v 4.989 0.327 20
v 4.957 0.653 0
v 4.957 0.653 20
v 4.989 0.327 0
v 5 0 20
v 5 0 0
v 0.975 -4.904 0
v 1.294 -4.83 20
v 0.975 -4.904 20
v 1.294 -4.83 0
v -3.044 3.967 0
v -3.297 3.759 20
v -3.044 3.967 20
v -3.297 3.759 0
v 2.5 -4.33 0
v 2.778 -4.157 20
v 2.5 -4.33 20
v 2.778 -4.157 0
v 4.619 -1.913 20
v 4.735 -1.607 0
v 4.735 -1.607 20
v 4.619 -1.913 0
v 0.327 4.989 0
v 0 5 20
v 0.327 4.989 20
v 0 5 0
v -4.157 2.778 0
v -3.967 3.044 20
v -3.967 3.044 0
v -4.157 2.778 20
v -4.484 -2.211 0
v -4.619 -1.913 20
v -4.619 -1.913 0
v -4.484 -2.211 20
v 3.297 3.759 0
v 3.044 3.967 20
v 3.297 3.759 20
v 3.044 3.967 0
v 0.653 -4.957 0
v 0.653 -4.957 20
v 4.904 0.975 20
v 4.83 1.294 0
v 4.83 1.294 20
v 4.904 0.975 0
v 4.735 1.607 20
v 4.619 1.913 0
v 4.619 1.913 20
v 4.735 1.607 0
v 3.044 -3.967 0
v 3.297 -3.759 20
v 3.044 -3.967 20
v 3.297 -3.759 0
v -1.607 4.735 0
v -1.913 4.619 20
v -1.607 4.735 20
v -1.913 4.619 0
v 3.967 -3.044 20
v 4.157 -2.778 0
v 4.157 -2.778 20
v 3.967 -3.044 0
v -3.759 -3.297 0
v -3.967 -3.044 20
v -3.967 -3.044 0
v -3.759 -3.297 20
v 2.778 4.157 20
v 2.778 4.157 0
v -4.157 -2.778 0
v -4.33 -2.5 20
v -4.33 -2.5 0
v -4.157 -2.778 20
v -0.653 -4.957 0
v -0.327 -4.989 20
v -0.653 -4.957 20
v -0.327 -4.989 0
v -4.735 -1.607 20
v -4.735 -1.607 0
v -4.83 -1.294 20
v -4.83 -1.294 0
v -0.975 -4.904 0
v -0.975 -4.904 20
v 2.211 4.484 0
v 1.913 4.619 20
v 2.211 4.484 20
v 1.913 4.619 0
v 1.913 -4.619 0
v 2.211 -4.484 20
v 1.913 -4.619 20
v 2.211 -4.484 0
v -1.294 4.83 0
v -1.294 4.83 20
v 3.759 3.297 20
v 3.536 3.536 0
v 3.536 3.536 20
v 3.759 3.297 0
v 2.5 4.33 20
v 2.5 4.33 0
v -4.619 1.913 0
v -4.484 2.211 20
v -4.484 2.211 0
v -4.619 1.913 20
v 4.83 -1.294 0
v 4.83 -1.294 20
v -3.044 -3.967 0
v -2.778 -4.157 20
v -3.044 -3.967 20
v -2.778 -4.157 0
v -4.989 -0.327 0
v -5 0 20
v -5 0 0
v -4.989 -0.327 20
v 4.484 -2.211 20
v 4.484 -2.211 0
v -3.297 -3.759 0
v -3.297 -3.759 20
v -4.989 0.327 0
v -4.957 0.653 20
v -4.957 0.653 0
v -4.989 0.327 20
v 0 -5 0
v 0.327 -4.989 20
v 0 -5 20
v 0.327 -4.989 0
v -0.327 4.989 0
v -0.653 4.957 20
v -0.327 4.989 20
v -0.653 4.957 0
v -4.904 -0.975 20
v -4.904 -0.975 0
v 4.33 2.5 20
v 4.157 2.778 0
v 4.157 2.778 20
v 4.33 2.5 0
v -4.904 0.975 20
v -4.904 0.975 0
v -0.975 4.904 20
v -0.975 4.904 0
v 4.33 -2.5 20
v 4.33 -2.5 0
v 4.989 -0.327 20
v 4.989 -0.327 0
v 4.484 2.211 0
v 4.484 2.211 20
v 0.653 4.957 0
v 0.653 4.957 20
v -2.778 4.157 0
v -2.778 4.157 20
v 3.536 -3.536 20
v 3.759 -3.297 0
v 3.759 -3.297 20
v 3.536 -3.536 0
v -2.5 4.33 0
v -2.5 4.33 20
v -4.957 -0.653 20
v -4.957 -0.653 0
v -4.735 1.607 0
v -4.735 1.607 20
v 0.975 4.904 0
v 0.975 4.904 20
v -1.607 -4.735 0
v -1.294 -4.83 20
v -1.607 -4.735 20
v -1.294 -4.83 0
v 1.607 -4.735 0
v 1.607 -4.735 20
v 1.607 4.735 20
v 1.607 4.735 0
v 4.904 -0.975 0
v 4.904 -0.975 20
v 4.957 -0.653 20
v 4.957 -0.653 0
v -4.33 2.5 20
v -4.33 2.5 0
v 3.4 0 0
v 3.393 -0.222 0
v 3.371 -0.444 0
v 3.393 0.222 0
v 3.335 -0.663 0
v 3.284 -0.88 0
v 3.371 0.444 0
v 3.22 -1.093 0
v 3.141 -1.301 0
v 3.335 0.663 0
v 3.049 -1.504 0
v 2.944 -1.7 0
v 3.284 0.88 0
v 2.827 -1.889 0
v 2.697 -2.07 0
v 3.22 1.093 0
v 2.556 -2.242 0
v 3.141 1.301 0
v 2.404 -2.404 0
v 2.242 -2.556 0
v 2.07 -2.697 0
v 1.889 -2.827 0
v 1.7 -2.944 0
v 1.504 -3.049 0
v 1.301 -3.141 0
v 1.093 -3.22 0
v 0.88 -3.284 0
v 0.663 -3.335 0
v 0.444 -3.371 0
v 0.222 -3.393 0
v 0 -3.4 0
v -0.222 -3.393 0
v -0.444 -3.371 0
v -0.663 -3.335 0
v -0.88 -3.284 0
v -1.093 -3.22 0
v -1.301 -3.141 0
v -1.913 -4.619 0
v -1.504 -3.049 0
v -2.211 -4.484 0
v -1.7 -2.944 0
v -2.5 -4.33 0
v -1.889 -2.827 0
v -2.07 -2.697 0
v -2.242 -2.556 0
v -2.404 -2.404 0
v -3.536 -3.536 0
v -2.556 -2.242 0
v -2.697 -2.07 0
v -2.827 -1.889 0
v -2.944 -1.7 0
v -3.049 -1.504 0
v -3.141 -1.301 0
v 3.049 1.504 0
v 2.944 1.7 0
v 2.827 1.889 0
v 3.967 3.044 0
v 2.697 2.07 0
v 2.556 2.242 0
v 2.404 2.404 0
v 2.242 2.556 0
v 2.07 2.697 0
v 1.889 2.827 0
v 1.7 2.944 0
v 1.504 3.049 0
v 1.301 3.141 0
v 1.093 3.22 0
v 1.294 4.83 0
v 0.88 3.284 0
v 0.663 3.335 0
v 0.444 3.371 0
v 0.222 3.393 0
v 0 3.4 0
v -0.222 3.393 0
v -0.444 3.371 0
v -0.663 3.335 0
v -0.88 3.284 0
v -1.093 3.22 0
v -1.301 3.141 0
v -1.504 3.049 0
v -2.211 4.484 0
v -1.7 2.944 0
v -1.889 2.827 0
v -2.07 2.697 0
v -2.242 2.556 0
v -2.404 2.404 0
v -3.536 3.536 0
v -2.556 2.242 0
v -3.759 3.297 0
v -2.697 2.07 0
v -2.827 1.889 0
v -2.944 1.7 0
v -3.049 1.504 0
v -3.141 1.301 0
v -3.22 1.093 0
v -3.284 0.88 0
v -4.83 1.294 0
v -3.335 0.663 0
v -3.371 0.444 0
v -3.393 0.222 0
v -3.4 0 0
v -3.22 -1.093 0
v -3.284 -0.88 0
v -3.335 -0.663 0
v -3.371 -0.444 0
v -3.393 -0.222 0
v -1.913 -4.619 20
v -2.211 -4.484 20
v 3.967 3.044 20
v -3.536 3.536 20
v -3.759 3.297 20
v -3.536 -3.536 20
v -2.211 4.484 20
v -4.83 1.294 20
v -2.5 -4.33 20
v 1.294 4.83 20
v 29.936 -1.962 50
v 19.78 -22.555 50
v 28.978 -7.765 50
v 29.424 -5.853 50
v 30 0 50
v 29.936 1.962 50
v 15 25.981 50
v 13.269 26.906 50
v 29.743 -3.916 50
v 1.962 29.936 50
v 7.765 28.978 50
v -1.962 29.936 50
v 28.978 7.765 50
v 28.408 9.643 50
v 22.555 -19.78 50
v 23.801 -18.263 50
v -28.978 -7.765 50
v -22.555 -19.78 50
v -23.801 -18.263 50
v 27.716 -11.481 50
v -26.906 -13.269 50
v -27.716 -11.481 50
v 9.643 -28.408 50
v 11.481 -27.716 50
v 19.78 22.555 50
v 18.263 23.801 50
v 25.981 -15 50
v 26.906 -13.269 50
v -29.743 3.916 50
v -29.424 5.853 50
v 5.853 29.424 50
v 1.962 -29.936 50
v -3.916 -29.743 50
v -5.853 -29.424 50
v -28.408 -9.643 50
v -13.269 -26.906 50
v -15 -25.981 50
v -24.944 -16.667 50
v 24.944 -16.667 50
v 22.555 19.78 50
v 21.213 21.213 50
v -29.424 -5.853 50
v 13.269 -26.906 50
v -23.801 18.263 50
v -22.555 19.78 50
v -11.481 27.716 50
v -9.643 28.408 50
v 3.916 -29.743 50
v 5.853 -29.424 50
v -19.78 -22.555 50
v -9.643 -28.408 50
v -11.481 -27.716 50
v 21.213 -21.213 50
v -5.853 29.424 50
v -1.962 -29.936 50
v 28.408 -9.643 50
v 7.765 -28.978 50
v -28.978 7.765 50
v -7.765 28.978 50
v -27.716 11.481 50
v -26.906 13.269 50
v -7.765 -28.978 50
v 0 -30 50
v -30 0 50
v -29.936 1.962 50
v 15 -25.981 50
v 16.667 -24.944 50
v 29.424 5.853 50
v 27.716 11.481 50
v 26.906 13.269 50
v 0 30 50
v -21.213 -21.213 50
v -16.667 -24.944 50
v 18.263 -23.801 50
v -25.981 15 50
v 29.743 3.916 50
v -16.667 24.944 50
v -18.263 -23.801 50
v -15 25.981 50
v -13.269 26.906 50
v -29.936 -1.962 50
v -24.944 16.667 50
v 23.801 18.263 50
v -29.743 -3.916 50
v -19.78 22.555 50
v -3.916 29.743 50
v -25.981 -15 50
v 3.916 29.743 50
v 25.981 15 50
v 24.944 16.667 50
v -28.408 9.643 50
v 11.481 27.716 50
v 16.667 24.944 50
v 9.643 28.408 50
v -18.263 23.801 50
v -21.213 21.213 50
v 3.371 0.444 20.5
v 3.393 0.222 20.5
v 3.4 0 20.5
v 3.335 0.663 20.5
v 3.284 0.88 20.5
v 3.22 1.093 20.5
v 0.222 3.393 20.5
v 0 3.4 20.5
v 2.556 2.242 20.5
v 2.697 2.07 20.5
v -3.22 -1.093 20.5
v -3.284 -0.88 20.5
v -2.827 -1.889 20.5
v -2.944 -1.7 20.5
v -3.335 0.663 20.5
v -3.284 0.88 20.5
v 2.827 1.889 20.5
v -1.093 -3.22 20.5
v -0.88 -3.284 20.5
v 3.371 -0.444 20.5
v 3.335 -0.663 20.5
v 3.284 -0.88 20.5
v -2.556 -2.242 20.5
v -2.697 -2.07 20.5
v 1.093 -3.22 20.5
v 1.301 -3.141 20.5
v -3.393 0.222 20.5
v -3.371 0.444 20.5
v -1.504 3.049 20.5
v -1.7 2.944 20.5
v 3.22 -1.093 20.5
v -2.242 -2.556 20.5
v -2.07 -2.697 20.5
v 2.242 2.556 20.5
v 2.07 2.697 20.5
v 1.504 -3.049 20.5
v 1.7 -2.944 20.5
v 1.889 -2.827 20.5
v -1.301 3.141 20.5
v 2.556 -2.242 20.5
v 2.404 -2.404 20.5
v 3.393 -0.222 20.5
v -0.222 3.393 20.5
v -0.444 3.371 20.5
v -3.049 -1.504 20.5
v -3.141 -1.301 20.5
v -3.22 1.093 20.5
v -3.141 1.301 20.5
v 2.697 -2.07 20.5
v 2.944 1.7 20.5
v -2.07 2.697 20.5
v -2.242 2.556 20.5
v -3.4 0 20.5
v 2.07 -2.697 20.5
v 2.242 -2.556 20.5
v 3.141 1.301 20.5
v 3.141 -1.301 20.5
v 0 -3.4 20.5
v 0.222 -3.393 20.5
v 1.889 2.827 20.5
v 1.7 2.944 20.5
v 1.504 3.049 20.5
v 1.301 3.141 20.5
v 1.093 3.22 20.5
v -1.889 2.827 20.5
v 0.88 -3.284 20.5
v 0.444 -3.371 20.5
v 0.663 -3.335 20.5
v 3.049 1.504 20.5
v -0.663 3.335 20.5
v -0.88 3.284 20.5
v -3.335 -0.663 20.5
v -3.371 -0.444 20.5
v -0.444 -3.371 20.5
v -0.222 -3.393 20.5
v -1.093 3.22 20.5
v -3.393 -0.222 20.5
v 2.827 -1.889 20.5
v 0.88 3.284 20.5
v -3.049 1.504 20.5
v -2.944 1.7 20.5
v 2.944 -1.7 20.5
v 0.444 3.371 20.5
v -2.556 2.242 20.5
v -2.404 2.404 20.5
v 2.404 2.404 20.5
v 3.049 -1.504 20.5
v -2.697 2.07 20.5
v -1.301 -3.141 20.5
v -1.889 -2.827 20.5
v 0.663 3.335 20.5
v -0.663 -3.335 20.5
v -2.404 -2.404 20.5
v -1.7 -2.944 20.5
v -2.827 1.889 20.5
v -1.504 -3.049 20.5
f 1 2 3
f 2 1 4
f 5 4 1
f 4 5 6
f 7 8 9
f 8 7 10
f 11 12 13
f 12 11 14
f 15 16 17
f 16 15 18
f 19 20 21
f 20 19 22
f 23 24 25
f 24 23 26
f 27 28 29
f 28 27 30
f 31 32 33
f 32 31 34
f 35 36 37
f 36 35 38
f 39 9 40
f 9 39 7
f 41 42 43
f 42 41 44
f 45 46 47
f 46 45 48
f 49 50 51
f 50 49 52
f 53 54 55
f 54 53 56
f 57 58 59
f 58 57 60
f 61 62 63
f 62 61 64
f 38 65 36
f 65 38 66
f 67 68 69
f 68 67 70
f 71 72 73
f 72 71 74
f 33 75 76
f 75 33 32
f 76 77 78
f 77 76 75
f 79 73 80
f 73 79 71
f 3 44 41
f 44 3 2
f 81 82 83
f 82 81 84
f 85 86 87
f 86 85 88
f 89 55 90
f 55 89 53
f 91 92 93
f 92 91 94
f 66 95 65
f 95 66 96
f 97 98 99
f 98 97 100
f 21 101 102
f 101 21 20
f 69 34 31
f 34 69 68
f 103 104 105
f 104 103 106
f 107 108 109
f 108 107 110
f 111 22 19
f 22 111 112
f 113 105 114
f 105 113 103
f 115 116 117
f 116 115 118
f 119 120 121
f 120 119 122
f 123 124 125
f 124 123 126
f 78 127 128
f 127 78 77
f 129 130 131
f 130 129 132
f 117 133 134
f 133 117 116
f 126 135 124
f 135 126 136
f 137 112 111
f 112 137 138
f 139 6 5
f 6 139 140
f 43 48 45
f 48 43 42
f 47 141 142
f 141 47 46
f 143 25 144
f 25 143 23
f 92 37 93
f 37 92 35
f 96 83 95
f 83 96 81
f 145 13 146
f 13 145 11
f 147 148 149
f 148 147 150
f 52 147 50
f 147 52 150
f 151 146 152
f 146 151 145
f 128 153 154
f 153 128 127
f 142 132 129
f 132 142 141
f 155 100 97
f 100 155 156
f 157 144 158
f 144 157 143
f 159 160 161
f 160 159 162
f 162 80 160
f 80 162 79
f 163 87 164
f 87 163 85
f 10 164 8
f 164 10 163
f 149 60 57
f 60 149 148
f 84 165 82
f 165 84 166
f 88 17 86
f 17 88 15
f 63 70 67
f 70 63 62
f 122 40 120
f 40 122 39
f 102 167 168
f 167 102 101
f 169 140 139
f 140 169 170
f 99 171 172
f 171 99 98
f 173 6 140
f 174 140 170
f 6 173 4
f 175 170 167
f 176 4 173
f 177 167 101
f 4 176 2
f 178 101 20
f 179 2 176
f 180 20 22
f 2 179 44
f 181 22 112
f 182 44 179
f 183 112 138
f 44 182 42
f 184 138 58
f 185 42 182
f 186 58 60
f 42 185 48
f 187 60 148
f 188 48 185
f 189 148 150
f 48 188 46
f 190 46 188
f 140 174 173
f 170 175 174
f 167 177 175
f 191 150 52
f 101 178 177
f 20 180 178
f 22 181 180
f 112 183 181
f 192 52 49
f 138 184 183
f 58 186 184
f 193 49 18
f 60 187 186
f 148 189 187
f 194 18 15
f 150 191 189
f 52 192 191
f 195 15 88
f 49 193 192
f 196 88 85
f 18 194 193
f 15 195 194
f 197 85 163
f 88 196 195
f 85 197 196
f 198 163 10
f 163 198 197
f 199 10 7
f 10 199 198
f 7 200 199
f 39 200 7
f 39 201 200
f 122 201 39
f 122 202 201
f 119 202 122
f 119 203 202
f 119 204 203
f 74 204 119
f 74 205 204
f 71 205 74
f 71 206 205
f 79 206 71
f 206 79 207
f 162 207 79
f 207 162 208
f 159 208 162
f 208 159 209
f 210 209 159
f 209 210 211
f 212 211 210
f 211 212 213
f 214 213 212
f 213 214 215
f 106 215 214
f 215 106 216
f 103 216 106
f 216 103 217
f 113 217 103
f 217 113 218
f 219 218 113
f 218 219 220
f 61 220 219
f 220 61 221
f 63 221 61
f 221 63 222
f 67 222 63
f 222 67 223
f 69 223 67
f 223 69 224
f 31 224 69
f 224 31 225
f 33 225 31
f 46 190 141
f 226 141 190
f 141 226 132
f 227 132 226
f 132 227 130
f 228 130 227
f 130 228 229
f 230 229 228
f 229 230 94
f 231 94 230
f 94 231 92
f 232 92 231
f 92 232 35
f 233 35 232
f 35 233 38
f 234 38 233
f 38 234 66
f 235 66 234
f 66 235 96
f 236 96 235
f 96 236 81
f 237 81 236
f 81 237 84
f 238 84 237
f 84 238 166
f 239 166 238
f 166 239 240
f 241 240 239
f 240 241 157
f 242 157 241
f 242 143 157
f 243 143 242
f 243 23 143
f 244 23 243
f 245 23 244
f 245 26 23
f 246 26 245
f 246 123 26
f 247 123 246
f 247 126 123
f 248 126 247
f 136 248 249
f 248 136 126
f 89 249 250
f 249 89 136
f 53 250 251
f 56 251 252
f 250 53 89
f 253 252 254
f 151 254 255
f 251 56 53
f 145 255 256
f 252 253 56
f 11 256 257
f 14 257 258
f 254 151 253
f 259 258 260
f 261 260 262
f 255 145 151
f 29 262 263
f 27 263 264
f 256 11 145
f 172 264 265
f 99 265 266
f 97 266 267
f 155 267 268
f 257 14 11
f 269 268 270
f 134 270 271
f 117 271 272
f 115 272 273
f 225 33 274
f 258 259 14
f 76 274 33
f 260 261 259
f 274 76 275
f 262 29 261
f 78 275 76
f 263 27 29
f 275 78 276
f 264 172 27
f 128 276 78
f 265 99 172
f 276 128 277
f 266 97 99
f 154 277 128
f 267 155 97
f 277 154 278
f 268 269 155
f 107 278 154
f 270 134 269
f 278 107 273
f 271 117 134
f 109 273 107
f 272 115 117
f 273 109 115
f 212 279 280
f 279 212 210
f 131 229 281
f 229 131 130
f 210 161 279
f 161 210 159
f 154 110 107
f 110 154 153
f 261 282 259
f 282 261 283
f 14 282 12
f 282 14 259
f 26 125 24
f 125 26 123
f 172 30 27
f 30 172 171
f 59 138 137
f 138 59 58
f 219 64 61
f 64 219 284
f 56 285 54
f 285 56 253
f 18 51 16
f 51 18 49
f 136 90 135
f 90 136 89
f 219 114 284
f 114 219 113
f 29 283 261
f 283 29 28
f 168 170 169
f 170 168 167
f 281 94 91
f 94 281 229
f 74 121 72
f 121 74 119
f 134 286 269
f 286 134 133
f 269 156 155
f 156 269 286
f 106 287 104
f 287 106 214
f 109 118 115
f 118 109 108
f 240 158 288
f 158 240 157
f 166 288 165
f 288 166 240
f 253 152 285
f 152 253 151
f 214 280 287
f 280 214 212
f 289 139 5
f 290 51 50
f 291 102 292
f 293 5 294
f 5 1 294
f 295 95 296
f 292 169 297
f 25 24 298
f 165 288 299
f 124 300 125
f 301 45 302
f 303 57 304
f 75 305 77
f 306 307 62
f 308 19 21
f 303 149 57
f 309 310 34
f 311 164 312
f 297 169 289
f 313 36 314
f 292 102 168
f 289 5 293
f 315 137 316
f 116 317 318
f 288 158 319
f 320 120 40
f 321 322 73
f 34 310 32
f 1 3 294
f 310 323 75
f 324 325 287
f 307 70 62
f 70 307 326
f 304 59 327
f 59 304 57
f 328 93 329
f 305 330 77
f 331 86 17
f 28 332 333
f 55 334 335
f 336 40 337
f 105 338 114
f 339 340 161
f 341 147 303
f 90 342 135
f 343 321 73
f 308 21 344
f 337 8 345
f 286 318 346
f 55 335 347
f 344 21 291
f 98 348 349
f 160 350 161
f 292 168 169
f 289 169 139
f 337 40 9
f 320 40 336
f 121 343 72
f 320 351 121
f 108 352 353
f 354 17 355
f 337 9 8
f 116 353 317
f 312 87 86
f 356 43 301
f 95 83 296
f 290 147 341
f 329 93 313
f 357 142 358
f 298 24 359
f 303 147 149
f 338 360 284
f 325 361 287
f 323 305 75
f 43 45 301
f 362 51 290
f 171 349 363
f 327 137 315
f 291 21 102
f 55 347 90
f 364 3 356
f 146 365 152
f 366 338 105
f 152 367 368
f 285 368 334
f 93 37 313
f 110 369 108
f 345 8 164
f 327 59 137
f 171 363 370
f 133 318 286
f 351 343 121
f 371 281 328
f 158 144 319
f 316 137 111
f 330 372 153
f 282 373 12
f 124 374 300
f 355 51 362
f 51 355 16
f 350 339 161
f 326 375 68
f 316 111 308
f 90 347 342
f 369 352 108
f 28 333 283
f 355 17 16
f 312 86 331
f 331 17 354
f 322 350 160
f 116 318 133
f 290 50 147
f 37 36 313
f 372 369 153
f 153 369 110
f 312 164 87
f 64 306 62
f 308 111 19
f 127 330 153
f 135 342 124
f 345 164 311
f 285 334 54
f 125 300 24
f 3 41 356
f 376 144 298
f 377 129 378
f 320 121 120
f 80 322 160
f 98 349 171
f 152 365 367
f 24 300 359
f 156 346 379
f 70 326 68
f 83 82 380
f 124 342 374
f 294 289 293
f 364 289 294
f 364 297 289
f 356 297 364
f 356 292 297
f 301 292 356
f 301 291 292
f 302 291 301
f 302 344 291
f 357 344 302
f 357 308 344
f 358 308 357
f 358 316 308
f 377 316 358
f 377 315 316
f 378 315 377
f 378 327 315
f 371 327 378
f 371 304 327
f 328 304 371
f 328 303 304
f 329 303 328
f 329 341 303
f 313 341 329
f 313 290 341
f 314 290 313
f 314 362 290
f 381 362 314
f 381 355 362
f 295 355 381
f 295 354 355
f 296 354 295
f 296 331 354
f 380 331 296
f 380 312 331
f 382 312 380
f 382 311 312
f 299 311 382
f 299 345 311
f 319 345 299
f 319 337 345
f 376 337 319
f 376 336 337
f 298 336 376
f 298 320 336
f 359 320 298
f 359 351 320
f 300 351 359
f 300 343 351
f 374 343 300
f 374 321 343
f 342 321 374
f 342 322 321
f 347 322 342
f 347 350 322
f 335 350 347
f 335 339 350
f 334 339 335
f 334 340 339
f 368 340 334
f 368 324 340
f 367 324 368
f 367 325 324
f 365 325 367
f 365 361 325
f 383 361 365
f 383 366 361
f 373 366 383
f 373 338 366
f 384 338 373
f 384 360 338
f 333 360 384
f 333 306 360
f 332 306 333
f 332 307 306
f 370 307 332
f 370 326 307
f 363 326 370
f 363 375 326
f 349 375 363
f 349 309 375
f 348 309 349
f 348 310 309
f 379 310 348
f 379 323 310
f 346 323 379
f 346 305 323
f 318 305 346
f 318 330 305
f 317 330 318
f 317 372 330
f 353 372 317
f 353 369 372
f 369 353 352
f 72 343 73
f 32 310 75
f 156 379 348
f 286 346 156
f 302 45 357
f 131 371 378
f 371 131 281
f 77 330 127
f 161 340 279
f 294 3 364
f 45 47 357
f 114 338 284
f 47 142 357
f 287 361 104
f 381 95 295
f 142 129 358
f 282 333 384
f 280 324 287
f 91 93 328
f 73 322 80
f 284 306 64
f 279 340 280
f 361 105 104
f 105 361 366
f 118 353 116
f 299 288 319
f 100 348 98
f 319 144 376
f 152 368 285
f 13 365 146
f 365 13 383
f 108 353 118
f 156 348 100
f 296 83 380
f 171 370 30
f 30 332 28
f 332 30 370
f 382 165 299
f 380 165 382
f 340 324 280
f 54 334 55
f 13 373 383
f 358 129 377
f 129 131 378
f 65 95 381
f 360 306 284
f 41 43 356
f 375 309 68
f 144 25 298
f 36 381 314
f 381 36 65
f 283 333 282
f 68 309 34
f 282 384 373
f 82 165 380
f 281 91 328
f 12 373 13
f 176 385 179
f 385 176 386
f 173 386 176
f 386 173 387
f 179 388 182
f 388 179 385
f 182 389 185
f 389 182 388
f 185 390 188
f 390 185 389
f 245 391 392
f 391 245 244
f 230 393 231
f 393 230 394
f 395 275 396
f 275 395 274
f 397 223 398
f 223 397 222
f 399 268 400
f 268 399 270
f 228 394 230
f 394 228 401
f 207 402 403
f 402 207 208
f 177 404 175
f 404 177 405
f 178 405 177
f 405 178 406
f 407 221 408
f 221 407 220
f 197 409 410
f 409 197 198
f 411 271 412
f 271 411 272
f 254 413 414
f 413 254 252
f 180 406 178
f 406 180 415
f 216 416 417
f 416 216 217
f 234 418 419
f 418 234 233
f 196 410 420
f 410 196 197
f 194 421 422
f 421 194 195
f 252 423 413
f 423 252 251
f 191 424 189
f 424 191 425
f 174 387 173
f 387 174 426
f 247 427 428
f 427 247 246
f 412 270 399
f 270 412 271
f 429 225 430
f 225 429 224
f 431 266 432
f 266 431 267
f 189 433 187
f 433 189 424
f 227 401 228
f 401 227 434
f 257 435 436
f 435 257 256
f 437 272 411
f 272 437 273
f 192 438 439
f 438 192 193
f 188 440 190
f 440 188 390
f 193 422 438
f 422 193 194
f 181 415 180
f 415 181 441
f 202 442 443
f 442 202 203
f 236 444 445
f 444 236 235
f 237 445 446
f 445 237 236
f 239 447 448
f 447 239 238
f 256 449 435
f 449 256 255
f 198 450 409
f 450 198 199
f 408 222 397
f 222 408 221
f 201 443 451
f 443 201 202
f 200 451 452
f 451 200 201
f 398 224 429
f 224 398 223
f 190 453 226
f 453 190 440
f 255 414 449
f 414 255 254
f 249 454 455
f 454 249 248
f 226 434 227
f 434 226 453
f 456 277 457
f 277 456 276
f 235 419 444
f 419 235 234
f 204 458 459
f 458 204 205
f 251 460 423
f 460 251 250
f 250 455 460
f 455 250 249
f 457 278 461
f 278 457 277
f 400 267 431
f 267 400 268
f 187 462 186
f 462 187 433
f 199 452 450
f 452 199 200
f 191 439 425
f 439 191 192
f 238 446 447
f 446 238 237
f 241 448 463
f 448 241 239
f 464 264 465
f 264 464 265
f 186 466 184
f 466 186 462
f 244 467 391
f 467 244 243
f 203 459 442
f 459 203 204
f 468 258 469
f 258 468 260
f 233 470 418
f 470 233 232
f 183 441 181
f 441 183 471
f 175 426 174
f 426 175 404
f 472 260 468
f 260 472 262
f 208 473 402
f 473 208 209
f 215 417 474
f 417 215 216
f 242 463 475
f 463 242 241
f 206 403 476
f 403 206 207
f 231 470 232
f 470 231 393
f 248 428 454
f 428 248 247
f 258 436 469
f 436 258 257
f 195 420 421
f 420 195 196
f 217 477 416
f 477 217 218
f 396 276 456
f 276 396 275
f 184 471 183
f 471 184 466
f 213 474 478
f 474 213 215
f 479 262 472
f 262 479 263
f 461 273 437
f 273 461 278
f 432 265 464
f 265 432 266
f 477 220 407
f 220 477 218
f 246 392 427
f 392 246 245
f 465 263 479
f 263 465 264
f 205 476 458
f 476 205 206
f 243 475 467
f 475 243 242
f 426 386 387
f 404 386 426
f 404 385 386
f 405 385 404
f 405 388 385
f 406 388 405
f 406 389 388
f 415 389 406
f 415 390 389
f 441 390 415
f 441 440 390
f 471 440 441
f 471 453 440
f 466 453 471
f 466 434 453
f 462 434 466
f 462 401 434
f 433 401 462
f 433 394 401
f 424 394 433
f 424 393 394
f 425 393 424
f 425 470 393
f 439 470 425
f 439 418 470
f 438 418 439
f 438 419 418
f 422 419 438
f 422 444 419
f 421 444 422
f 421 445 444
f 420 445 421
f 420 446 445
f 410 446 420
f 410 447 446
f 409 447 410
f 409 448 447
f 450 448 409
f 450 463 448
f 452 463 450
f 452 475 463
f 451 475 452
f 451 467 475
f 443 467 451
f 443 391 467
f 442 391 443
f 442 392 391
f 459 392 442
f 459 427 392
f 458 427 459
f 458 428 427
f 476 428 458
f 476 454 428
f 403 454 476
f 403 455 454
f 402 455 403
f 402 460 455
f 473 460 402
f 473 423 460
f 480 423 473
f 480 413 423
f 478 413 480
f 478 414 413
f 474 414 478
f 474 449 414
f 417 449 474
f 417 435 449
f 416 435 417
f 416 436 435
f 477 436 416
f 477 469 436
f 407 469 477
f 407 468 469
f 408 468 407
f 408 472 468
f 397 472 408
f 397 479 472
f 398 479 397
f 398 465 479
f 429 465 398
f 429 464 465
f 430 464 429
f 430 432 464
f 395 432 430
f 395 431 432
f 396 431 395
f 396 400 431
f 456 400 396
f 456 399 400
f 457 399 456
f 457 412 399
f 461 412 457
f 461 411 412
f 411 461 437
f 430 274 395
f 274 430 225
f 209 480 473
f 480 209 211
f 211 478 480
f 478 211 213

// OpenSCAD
// Small lab funnel - printed upright, open top and bottom
// Units: mm. Wall thickness 1.6 mm throughout.

$fn = 96;

// ---- Dimensions ----
spout_od      = 10;    // spout outer diameter (z = 0 to 20)
spout_len     = 20;    // spout length (z = 0 to 20)
cone_bottom_d = 10;    // cone outer diameter at z = 20
cone_top_d    = 60;    // cone outer diameter at rim (z = 50)
wall          = 1.6;   // wall thickness
eps           = 0.5;   // cutter overshoot past faces

// ---- Derived ----
spout_id = spout_od - 2 * wall;   // bore diameter (6.8 mm)
cone_h   = 50 - 20;               // cone height (30 mm)

difference() {
    union() {
        // Spout (tube)
        cylinder(d = spout_od, h = spout_len);

        // Cone: frustum from bottom_d at z = 20 to top_d at z = 50
        translate([0, 0, spout_len])
            cylinder(d1 = cone_bottom_d, d2 = cone_top_d, h = cone_h);
    }

    // Bottom outlet bore, through the spout
    translate([0, 0, -eps])
        cylinder(d = spout_id, h = spout_len + 2 * eps);
}
